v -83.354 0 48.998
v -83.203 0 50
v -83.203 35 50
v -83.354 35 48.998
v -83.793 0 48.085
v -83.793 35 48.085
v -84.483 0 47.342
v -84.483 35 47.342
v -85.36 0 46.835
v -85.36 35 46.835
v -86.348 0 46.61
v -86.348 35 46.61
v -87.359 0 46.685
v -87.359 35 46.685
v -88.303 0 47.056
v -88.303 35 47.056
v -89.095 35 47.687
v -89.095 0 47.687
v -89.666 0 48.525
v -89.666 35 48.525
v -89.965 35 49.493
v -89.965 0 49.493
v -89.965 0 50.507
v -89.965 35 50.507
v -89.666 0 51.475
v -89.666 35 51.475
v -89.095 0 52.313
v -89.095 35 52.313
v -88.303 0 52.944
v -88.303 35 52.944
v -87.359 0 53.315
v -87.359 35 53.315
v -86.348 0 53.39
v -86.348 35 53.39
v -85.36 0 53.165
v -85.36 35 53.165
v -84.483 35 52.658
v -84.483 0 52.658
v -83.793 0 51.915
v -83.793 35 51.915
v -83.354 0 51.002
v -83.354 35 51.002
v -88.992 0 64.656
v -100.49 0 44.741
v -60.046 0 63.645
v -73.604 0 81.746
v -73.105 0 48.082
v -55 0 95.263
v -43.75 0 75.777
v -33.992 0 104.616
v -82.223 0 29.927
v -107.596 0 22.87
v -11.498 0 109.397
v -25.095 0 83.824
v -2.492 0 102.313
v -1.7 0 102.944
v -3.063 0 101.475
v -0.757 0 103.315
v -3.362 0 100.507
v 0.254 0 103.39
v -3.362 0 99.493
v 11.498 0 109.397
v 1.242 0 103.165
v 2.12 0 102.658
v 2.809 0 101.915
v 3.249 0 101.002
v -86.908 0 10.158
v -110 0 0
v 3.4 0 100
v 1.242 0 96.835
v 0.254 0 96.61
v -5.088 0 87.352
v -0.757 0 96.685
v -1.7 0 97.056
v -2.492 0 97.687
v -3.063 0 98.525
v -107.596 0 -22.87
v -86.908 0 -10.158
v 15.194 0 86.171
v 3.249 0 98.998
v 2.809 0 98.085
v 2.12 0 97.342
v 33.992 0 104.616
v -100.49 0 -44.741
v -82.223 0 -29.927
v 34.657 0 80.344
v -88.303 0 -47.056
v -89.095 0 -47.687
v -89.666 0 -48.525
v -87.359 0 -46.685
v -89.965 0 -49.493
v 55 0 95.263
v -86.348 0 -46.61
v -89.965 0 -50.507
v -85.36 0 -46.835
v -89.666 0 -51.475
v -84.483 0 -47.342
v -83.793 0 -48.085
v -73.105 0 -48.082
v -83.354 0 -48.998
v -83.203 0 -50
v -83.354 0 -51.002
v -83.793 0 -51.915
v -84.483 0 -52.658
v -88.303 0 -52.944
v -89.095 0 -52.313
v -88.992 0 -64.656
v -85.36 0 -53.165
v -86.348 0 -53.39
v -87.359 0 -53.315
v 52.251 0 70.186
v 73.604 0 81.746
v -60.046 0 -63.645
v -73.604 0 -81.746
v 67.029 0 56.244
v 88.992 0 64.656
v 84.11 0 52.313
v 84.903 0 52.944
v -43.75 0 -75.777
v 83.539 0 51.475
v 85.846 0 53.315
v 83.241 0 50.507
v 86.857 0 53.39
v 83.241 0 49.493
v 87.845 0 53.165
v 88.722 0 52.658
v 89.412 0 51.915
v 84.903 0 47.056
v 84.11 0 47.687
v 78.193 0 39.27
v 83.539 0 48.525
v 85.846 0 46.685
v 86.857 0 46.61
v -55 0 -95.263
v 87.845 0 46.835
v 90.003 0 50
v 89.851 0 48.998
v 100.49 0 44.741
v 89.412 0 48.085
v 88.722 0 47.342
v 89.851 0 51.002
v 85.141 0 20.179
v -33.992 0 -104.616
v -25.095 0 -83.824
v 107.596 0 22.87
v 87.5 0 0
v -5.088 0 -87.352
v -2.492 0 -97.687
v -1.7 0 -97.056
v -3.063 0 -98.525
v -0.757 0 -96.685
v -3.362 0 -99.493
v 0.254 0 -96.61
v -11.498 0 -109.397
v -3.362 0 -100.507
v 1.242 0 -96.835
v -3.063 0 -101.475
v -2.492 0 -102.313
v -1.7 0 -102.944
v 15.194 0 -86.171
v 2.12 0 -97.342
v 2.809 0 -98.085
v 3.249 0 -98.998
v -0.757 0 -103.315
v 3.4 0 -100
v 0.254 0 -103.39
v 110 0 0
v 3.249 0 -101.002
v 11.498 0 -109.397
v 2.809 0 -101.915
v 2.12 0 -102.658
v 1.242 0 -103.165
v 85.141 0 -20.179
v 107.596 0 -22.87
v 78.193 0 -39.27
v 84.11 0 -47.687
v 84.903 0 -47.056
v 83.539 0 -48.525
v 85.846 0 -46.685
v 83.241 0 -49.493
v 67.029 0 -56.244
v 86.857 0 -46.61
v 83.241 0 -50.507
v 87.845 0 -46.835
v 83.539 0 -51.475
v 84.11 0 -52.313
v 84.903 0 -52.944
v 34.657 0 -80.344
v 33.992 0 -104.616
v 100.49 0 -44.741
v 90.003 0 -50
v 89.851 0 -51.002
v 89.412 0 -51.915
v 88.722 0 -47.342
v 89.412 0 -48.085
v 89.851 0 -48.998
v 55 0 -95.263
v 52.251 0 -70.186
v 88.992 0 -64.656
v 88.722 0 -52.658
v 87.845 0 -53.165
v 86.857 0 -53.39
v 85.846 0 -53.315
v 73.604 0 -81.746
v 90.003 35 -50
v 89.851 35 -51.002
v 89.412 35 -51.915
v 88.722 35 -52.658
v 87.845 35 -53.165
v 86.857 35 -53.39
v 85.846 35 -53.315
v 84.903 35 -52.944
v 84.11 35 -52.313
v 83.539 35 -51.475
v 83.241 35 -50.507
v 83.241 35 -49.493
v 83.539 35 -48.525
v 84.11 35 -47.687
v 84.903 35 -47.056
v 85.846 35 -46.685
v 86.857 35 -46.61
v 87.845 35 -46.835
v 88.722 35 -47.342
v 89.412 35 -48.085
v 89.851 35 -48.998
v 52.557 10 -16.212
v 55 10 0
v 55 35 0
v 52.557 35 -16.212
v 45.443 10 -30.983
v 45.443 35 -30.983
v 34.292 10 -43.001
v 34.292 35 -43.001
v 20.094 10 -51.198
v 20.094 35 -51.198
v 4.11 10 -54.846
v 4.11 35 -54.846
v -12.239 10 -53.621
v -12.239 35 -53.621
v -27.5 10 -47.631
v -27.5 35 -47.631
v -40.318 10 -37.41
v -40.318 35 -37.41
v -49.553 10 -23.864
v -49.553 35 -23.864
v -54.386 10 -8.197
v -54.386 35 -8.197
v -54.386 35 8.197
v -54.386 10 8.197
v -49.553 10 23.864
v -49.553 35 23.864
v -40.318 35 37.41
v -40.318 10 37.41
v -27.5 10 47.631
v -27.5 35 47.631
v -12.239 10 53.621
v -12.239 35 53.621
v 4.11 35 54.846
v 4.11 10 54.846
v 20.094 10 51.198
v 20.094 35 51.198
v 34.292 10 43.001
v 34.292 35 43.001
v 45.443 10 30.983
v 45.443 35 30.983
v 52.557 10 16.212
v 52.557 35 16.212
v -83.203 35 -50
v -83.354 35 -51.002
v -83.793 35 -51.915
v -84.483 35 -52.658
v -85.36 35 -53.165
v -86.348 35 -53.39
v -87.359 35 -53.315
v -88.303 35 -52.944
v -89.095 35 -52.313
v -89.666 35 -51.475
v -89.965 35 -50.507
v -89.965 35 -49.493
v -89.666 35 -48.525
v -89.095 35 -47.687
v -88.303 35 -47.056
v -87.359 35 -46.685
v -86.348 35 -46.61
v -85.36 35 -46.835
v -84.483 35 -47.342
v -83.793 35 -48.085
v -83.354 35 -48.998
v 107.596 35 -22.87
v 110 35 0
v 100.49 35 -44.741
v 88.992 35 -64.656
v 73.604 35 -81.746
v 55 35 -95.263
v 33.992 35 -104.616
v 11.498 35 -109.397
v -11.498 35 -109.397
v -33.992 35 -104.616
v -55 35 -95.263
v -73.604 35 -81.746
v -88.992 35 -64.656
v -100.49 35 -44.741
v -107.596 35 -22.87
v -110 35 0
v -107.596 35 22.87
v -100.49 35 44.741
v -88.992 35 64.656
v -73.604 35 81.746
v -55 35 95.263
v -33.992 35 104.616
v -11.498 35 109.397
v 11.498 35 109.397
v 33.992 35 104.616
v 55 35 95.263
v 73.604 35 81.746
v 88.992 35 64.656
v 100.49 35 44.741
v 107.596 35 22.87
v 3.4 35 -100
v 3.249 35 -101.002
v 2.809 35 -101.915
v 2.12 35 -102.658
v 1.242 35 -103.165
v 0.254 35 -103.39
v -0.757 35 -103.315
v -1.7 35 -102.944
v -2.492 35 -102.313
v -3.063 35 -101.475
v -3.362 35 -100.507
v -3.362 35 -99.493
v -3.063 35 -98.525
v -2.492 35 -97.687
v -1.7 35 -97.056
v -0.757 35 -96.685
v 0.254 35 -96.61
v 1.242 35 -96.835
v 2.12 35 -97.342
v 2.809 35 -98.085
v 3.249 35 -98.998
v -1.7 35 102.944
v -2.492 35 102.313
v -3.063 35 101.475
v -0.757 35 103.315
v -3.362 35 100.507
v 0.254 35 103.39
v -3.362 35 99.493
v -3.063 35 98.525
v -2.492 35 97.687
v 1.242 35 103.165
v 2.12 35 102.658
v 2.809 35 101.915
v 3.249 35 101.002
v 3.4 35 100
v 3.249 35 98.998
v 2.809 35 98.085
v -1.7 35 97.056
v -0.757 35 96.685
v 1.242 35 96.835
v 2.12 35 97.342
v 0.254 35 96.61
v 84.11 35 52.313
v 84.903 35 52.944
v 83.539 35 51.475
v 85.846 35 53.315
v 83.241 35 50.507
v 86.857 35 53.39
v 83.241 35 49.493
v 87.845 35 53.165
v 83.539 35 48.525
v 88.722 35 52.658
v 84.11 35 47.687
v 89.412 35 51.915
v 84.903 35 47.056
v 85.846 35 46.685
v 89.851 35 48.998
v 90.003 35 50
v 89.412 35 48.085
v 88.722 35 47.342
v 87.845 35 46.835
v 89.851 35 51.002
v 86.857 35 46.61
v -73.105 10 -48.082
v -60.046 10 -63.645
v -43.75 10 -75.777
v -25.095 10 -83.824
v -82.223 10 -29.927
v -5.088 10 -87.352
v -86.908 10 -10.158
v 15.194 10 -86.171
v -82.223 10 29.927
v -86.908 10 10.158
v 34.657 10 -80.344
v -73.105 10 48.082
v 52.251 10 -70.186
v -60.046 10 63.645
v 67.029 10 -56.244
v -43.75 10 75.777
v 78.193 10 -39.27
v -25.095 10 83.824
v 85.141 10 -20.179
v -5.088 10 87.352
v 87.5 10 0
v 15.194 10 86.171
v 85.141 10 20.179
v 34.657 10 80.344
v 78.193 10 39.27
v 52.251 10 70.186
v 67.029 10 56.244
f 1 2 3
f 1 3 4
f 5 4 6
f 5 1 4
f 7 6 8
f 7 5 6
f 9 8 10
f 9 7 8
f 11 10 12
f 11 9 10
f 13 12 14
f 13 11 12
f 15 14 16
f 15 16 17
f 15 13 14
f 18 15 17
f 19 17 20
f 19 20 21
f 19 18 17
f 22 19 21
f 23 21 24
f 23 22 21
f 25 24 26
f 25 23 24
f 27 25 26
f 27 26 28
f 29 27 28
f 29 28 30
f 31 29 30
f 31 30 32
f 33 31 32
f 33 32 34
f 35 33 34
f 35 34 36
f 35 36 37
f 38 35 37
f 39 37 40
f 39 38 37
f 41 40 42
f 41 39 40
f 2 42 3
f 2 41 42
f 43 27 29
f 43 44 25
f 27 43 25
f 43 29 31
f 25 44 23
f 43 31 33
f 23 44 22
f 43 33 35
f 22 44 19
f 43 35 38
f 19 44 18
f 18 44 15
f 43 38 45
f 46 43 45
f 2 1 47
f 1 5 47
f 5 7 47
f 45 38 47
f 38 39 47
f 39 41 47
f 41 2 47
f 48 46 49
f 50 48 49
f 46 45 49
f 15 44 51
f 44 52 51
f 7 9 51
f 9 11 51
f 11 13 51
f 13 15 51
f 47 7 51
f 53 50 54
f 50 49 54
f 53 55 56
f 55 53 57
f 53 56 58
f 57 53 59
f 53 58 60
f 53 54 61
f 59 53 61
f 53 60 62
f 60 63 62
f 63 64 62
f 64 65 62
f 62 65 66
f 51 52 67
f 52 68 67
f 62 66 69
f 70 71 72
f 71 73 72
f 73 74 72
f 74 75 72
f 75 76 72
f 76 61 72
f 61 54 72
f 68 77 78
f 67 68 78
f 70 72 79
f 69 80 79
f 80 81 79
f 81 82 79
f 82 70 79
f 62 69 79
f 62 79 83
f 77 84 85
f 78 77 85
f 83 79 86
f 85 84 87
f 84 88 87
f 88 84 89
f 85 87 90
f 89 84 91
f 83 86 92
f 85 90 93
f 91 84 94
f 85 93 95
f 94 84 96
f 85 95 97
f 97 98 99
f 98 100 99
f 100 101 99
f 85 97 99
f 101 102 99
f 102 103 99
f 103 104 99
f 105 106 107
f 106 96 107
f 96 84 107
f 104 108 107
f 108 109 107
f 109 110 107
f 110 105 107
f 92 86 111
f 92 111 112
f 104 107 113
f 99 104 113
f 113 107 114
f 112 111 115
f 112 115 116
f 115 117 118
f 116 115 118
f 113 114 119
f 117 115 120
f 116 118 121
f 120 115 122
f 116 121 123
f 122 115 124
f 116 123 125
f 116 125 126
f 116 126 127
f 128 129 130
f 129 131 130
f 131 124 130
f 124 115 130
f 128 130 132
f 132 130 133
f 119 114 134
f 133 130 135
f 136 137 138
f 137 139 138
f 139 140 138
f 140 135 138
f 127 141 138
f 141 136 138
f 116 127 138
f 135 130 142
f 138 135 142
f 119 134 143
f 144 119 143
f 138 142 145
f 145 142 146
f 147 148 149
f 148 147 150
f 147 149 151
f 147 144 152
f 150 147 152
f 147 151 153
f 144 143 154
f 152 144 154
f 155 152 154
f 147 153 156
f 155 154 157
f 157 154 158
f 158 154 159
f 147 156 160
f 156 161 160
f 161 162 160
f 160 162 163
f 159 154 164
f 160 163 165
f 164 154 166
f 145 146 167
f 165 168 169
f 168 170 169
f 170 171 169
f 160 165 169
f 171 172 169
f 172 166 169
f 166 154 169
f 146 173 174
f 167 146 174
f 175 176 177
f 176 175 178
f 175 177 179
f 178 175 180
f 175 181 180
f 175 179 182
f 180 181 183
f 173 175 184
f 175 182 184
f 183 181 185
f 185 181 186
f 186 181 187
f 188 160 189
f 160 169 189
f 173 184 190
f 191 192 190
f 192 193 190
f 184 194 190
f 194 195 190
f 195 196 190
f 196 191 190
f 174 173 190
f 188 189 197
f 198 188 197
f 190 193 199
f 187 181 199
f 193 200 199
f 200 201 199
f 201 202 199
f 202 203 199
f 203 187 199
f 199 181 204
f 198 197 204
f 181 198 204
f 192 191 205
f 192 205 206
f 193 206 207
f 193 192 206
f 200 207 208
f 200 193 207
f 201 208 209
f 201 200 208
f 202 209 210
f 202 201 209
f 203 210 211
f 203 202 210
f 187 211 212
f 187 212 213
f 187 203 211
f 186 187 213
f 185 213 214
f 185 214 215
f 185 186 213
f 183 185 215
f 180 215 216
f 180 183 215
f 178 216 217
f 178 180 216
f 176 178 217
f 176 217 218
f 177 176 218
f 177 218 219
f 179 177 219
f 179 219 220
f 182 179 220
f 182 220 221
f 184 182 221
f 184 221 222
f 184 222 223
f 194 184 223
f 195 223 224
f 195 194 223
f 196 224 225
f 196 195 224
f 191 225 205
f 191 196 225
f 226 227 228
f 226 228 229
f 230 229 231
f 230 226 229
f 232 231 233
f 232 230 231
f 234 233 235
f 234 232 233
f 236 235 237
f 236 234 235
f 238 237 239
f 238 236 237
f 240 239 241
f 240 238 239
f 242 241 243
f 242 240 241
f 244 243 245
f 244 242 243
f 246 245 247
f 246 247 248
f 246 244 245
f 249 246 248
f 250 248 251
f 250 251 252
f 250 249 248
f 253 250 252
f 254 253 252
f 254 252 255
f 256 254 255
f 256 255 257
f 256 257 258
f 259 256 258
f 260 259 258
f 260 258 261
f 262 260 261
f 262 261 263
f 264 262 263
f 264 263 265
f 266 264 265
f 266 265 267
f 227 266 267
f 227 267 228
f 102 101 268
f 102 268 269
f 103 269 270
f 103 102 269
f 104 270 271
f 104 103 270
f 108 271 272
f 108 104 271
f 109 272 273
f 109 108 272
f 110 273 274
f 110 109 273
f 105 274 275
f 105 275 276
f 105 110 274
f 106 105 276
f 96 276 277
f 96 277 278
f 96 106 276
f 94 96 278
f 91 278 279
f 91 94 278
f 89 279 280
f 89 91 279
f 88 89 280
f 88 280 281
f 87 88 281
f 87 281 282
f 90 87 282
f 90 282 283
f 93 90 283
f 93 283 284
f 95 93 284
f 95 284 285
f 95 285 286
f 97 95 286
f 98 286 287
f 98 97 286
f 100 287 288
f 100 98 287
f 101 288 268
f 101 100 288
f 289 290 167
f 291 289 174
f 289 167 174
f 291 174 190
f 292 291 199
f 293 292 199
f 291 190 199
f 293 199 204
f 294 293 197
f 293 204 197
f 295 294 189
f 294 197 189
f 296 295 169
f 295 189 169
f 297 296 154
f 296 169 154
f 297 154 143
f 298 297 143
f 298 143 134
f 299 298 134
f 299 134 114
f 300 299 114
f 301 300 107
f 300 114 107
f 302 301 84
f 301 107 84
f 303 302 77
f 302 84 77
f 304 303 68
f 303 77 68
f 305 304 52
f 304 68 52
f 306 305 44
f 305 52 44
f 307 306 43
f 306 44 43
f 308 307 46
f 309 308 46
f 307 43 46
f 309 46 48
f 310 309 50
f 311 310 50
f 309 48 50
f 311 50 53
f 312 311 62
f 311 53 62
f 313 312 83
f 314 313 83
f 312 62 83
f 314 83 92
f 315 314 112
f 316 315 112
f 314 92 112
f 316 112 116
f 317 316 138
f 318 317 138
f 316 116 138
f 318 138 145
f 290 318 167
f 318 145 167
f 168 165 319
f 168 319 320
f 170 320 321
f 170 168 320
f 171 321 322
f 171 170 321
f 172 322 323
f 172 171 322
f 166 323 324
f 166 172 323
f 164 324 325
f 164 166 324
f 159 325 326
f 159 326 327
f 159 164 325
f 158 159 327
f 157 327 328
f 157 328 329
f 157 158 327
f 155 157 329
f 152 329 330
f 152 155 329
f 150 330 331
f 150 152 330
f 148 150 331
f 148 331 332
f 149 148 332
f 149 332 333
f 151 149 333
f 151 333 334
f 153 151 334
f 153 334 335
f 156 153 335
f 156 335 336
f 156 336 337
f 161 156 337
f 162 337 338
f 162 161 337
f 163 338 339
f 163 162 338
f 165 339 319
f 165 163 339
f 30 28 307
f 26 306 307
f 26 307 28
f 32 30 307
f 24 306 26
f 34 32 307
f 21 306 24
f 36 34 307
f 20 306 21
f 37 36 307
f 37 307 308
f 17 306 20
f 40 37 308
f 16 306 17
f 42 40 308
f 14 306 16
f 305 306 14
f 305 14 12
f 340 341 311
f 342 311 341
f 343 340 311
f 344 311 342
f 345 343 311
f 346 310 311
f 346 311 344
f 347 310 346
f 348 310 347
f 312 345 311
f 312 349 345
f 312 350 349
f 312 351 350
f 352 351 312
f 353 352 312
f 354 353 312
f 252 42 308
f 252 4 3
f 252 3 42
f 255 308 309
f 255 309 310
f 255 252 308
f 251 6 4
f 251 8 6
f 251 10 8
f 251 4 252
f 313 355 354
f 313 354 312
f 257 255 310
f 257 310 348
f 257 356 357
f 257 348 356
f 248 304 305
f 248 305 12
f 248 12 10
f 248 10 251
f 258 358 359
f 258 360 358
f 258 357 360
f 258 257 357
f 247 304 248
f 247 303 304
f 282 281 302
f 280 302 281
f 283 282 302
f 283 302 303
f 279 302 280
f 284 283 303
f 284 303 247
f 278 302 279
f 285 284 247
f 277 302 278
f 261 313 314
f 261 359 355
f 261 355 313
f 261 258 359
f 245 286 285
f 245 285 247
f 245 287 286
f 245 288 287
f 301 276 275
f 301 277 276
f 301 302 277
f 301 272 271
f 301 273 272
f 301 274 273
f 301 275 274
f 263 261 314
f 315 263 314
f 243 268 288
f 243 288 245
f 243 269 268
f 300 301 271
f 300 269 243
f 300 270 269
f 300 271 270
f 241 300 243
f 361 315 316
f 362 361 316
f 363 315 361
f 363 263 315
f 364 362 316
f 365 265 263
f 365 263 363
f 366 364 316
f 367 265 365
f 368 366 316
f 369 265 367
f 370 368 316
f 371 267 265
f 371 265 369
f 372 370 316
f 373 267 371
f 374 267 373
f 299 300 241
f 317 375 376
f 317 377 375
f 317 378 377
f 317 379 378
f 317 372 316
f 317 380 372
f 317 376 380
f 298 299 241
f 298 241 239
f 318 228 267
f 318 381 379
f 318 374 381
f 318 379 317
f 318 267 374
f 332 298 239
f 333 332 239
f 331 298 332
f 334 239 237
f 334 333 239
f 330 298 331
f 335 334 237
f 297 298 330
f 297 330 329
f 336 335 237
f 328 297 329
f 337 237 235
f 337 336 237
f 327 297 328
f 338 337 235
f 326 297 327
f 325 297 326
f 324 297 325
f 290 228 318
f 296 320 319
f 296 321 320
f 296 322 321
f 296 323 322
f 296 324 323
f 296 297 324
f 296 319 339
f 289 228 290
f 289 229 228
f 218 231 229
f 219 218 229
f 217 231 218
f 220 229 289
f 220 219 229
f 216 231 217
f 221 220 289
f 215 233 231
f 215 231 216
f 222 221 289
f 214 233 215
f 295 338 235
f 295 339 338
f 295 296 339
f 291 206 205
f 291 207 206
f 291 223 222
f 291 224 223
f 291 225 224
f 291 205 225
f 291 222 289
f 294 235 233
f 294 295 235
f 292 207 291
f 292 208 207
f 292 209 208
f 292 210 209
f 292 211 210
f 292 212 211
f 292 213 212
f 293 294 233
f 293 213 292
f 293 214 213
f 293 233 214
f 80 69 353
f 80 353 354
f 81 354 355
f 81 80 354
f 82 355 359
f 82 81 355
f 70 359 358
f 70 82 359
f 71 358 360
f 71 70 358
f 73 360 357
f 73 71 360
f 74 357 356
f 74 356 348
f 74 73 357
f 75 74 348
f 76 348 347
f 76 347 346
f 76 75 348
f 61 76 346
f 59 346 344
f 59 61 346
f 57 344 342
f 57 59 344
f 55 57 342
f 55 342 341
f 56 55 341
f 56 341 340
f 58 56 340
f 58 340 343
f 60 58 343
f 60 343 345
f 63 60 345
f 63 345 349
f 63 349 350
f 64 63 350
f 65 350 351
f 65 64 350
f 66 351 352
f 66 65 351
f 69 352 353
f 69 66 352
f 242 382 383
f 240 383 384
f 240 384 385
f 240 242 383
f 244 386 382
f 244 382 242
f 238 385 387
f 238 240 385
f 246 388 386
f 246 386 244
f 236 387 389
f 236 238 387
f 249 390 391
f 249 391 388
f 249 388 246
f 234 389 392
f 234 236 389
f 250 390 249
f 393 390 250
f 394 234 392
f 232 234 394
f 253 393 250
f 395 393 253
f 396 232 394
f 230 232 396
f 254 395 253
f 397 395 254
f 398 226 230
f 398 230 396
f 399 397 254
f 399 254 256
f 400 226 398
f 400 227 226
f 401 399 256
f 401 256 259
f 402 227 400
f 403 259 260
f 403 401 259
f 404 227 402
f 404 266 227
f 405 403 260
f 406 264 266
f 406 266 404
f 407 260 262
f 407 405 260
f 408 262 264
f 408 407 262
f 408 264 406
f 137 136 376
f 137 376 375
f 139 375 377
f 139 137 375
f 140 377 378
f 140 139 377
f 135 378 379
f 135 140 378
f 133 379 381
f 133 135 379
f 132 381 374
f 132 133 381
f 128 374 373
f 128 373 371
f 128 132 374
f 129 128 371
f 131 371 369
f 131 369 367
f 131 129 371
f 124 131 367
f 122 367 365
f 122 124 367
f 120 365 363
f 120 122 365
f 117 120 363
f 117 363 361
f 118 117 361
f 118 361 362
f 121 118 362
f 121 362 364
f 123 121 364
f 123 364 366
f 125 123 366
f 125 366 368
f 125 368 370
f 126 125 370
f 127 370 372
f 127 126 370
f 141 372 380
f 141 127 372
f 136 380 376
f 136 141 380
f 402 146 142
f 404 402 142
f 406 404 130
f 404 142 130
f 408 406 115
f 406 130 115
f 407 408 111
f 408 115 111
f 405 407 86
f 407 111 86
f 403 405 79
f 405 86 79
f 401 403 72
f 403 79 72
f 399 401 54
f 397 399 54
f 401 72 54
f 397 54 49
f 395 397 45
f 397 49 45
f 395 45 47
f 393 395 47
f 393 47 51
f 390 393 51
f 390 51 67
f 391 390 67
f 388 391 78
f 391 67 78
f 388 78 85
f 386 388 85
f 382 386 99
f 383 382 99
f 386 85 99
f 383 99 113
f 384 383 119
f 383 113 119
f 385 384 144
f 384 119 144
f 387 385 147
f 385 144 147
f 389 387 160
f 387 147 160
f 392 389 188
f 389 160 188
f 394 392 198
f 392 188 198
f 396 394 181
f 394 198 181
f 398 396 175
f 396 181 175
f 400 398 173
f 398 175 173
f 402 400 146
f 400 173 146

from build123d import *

# Parameters (mm, degrees)
SKETCH1_R           = 110
SKETCH1_R_2         = 55
SKETCH1_R_3         = 3.4
BOSS_EXTRUDE1_DEPTH = 35
SKETCH2_R           = 87.5
CUT_EXTRUDE1_DEPTH  = 10


with BuildPart() as part:
    # Sketch1 → Boss-Extrude1 (new body)
    with BuildSketch(Plane(origin=(0, 0, 0), x_dir=(1, 0, 0), z_dir=(0, 1, 0))):
        Circle(SKETCH1_R)
        Circle(SKETCH1_R_2, mode=Mode.SUBTRACT)
        with Locations((0, 100)):
            Circle(SKETCH1_R_3, mode=Mode.SUBTRACT)
        with Locations((86.602540378, 50)):
            Circle(SKETCH1_R_3, mode=Mode.SUBTRACT)
        with Locations((86.602540378, -50)):
            Circle(SKETCH1_R_3, mode=Mode.SUBTRACT)
        with Locations((0, -100)):
            Circle(SKETCH1_R_3, mode=Mode.SUBTRACT)
        with Locations((-86.602540378, -50)):
            Circle(SKETCH1_R_3, mode=Mode.SUBTRACT)
        with Locations((-86.602540378, 50)):
            Circle(SKETCH1_R_3, mode=Mode.SUBTRACT)
    extrude(amount=BOSS_EXTRUDE1_DEPTH)

    # Sketch2 → Cut-Extrude1 (cut)
    with BuildSketch(Plane.XZ):
        Circle(SKETCH2_R)
    extrude(amount=-CUT_EXTRUDE1_DEPTH, mode=Mode.SUBTRACT)


solid = part.part
